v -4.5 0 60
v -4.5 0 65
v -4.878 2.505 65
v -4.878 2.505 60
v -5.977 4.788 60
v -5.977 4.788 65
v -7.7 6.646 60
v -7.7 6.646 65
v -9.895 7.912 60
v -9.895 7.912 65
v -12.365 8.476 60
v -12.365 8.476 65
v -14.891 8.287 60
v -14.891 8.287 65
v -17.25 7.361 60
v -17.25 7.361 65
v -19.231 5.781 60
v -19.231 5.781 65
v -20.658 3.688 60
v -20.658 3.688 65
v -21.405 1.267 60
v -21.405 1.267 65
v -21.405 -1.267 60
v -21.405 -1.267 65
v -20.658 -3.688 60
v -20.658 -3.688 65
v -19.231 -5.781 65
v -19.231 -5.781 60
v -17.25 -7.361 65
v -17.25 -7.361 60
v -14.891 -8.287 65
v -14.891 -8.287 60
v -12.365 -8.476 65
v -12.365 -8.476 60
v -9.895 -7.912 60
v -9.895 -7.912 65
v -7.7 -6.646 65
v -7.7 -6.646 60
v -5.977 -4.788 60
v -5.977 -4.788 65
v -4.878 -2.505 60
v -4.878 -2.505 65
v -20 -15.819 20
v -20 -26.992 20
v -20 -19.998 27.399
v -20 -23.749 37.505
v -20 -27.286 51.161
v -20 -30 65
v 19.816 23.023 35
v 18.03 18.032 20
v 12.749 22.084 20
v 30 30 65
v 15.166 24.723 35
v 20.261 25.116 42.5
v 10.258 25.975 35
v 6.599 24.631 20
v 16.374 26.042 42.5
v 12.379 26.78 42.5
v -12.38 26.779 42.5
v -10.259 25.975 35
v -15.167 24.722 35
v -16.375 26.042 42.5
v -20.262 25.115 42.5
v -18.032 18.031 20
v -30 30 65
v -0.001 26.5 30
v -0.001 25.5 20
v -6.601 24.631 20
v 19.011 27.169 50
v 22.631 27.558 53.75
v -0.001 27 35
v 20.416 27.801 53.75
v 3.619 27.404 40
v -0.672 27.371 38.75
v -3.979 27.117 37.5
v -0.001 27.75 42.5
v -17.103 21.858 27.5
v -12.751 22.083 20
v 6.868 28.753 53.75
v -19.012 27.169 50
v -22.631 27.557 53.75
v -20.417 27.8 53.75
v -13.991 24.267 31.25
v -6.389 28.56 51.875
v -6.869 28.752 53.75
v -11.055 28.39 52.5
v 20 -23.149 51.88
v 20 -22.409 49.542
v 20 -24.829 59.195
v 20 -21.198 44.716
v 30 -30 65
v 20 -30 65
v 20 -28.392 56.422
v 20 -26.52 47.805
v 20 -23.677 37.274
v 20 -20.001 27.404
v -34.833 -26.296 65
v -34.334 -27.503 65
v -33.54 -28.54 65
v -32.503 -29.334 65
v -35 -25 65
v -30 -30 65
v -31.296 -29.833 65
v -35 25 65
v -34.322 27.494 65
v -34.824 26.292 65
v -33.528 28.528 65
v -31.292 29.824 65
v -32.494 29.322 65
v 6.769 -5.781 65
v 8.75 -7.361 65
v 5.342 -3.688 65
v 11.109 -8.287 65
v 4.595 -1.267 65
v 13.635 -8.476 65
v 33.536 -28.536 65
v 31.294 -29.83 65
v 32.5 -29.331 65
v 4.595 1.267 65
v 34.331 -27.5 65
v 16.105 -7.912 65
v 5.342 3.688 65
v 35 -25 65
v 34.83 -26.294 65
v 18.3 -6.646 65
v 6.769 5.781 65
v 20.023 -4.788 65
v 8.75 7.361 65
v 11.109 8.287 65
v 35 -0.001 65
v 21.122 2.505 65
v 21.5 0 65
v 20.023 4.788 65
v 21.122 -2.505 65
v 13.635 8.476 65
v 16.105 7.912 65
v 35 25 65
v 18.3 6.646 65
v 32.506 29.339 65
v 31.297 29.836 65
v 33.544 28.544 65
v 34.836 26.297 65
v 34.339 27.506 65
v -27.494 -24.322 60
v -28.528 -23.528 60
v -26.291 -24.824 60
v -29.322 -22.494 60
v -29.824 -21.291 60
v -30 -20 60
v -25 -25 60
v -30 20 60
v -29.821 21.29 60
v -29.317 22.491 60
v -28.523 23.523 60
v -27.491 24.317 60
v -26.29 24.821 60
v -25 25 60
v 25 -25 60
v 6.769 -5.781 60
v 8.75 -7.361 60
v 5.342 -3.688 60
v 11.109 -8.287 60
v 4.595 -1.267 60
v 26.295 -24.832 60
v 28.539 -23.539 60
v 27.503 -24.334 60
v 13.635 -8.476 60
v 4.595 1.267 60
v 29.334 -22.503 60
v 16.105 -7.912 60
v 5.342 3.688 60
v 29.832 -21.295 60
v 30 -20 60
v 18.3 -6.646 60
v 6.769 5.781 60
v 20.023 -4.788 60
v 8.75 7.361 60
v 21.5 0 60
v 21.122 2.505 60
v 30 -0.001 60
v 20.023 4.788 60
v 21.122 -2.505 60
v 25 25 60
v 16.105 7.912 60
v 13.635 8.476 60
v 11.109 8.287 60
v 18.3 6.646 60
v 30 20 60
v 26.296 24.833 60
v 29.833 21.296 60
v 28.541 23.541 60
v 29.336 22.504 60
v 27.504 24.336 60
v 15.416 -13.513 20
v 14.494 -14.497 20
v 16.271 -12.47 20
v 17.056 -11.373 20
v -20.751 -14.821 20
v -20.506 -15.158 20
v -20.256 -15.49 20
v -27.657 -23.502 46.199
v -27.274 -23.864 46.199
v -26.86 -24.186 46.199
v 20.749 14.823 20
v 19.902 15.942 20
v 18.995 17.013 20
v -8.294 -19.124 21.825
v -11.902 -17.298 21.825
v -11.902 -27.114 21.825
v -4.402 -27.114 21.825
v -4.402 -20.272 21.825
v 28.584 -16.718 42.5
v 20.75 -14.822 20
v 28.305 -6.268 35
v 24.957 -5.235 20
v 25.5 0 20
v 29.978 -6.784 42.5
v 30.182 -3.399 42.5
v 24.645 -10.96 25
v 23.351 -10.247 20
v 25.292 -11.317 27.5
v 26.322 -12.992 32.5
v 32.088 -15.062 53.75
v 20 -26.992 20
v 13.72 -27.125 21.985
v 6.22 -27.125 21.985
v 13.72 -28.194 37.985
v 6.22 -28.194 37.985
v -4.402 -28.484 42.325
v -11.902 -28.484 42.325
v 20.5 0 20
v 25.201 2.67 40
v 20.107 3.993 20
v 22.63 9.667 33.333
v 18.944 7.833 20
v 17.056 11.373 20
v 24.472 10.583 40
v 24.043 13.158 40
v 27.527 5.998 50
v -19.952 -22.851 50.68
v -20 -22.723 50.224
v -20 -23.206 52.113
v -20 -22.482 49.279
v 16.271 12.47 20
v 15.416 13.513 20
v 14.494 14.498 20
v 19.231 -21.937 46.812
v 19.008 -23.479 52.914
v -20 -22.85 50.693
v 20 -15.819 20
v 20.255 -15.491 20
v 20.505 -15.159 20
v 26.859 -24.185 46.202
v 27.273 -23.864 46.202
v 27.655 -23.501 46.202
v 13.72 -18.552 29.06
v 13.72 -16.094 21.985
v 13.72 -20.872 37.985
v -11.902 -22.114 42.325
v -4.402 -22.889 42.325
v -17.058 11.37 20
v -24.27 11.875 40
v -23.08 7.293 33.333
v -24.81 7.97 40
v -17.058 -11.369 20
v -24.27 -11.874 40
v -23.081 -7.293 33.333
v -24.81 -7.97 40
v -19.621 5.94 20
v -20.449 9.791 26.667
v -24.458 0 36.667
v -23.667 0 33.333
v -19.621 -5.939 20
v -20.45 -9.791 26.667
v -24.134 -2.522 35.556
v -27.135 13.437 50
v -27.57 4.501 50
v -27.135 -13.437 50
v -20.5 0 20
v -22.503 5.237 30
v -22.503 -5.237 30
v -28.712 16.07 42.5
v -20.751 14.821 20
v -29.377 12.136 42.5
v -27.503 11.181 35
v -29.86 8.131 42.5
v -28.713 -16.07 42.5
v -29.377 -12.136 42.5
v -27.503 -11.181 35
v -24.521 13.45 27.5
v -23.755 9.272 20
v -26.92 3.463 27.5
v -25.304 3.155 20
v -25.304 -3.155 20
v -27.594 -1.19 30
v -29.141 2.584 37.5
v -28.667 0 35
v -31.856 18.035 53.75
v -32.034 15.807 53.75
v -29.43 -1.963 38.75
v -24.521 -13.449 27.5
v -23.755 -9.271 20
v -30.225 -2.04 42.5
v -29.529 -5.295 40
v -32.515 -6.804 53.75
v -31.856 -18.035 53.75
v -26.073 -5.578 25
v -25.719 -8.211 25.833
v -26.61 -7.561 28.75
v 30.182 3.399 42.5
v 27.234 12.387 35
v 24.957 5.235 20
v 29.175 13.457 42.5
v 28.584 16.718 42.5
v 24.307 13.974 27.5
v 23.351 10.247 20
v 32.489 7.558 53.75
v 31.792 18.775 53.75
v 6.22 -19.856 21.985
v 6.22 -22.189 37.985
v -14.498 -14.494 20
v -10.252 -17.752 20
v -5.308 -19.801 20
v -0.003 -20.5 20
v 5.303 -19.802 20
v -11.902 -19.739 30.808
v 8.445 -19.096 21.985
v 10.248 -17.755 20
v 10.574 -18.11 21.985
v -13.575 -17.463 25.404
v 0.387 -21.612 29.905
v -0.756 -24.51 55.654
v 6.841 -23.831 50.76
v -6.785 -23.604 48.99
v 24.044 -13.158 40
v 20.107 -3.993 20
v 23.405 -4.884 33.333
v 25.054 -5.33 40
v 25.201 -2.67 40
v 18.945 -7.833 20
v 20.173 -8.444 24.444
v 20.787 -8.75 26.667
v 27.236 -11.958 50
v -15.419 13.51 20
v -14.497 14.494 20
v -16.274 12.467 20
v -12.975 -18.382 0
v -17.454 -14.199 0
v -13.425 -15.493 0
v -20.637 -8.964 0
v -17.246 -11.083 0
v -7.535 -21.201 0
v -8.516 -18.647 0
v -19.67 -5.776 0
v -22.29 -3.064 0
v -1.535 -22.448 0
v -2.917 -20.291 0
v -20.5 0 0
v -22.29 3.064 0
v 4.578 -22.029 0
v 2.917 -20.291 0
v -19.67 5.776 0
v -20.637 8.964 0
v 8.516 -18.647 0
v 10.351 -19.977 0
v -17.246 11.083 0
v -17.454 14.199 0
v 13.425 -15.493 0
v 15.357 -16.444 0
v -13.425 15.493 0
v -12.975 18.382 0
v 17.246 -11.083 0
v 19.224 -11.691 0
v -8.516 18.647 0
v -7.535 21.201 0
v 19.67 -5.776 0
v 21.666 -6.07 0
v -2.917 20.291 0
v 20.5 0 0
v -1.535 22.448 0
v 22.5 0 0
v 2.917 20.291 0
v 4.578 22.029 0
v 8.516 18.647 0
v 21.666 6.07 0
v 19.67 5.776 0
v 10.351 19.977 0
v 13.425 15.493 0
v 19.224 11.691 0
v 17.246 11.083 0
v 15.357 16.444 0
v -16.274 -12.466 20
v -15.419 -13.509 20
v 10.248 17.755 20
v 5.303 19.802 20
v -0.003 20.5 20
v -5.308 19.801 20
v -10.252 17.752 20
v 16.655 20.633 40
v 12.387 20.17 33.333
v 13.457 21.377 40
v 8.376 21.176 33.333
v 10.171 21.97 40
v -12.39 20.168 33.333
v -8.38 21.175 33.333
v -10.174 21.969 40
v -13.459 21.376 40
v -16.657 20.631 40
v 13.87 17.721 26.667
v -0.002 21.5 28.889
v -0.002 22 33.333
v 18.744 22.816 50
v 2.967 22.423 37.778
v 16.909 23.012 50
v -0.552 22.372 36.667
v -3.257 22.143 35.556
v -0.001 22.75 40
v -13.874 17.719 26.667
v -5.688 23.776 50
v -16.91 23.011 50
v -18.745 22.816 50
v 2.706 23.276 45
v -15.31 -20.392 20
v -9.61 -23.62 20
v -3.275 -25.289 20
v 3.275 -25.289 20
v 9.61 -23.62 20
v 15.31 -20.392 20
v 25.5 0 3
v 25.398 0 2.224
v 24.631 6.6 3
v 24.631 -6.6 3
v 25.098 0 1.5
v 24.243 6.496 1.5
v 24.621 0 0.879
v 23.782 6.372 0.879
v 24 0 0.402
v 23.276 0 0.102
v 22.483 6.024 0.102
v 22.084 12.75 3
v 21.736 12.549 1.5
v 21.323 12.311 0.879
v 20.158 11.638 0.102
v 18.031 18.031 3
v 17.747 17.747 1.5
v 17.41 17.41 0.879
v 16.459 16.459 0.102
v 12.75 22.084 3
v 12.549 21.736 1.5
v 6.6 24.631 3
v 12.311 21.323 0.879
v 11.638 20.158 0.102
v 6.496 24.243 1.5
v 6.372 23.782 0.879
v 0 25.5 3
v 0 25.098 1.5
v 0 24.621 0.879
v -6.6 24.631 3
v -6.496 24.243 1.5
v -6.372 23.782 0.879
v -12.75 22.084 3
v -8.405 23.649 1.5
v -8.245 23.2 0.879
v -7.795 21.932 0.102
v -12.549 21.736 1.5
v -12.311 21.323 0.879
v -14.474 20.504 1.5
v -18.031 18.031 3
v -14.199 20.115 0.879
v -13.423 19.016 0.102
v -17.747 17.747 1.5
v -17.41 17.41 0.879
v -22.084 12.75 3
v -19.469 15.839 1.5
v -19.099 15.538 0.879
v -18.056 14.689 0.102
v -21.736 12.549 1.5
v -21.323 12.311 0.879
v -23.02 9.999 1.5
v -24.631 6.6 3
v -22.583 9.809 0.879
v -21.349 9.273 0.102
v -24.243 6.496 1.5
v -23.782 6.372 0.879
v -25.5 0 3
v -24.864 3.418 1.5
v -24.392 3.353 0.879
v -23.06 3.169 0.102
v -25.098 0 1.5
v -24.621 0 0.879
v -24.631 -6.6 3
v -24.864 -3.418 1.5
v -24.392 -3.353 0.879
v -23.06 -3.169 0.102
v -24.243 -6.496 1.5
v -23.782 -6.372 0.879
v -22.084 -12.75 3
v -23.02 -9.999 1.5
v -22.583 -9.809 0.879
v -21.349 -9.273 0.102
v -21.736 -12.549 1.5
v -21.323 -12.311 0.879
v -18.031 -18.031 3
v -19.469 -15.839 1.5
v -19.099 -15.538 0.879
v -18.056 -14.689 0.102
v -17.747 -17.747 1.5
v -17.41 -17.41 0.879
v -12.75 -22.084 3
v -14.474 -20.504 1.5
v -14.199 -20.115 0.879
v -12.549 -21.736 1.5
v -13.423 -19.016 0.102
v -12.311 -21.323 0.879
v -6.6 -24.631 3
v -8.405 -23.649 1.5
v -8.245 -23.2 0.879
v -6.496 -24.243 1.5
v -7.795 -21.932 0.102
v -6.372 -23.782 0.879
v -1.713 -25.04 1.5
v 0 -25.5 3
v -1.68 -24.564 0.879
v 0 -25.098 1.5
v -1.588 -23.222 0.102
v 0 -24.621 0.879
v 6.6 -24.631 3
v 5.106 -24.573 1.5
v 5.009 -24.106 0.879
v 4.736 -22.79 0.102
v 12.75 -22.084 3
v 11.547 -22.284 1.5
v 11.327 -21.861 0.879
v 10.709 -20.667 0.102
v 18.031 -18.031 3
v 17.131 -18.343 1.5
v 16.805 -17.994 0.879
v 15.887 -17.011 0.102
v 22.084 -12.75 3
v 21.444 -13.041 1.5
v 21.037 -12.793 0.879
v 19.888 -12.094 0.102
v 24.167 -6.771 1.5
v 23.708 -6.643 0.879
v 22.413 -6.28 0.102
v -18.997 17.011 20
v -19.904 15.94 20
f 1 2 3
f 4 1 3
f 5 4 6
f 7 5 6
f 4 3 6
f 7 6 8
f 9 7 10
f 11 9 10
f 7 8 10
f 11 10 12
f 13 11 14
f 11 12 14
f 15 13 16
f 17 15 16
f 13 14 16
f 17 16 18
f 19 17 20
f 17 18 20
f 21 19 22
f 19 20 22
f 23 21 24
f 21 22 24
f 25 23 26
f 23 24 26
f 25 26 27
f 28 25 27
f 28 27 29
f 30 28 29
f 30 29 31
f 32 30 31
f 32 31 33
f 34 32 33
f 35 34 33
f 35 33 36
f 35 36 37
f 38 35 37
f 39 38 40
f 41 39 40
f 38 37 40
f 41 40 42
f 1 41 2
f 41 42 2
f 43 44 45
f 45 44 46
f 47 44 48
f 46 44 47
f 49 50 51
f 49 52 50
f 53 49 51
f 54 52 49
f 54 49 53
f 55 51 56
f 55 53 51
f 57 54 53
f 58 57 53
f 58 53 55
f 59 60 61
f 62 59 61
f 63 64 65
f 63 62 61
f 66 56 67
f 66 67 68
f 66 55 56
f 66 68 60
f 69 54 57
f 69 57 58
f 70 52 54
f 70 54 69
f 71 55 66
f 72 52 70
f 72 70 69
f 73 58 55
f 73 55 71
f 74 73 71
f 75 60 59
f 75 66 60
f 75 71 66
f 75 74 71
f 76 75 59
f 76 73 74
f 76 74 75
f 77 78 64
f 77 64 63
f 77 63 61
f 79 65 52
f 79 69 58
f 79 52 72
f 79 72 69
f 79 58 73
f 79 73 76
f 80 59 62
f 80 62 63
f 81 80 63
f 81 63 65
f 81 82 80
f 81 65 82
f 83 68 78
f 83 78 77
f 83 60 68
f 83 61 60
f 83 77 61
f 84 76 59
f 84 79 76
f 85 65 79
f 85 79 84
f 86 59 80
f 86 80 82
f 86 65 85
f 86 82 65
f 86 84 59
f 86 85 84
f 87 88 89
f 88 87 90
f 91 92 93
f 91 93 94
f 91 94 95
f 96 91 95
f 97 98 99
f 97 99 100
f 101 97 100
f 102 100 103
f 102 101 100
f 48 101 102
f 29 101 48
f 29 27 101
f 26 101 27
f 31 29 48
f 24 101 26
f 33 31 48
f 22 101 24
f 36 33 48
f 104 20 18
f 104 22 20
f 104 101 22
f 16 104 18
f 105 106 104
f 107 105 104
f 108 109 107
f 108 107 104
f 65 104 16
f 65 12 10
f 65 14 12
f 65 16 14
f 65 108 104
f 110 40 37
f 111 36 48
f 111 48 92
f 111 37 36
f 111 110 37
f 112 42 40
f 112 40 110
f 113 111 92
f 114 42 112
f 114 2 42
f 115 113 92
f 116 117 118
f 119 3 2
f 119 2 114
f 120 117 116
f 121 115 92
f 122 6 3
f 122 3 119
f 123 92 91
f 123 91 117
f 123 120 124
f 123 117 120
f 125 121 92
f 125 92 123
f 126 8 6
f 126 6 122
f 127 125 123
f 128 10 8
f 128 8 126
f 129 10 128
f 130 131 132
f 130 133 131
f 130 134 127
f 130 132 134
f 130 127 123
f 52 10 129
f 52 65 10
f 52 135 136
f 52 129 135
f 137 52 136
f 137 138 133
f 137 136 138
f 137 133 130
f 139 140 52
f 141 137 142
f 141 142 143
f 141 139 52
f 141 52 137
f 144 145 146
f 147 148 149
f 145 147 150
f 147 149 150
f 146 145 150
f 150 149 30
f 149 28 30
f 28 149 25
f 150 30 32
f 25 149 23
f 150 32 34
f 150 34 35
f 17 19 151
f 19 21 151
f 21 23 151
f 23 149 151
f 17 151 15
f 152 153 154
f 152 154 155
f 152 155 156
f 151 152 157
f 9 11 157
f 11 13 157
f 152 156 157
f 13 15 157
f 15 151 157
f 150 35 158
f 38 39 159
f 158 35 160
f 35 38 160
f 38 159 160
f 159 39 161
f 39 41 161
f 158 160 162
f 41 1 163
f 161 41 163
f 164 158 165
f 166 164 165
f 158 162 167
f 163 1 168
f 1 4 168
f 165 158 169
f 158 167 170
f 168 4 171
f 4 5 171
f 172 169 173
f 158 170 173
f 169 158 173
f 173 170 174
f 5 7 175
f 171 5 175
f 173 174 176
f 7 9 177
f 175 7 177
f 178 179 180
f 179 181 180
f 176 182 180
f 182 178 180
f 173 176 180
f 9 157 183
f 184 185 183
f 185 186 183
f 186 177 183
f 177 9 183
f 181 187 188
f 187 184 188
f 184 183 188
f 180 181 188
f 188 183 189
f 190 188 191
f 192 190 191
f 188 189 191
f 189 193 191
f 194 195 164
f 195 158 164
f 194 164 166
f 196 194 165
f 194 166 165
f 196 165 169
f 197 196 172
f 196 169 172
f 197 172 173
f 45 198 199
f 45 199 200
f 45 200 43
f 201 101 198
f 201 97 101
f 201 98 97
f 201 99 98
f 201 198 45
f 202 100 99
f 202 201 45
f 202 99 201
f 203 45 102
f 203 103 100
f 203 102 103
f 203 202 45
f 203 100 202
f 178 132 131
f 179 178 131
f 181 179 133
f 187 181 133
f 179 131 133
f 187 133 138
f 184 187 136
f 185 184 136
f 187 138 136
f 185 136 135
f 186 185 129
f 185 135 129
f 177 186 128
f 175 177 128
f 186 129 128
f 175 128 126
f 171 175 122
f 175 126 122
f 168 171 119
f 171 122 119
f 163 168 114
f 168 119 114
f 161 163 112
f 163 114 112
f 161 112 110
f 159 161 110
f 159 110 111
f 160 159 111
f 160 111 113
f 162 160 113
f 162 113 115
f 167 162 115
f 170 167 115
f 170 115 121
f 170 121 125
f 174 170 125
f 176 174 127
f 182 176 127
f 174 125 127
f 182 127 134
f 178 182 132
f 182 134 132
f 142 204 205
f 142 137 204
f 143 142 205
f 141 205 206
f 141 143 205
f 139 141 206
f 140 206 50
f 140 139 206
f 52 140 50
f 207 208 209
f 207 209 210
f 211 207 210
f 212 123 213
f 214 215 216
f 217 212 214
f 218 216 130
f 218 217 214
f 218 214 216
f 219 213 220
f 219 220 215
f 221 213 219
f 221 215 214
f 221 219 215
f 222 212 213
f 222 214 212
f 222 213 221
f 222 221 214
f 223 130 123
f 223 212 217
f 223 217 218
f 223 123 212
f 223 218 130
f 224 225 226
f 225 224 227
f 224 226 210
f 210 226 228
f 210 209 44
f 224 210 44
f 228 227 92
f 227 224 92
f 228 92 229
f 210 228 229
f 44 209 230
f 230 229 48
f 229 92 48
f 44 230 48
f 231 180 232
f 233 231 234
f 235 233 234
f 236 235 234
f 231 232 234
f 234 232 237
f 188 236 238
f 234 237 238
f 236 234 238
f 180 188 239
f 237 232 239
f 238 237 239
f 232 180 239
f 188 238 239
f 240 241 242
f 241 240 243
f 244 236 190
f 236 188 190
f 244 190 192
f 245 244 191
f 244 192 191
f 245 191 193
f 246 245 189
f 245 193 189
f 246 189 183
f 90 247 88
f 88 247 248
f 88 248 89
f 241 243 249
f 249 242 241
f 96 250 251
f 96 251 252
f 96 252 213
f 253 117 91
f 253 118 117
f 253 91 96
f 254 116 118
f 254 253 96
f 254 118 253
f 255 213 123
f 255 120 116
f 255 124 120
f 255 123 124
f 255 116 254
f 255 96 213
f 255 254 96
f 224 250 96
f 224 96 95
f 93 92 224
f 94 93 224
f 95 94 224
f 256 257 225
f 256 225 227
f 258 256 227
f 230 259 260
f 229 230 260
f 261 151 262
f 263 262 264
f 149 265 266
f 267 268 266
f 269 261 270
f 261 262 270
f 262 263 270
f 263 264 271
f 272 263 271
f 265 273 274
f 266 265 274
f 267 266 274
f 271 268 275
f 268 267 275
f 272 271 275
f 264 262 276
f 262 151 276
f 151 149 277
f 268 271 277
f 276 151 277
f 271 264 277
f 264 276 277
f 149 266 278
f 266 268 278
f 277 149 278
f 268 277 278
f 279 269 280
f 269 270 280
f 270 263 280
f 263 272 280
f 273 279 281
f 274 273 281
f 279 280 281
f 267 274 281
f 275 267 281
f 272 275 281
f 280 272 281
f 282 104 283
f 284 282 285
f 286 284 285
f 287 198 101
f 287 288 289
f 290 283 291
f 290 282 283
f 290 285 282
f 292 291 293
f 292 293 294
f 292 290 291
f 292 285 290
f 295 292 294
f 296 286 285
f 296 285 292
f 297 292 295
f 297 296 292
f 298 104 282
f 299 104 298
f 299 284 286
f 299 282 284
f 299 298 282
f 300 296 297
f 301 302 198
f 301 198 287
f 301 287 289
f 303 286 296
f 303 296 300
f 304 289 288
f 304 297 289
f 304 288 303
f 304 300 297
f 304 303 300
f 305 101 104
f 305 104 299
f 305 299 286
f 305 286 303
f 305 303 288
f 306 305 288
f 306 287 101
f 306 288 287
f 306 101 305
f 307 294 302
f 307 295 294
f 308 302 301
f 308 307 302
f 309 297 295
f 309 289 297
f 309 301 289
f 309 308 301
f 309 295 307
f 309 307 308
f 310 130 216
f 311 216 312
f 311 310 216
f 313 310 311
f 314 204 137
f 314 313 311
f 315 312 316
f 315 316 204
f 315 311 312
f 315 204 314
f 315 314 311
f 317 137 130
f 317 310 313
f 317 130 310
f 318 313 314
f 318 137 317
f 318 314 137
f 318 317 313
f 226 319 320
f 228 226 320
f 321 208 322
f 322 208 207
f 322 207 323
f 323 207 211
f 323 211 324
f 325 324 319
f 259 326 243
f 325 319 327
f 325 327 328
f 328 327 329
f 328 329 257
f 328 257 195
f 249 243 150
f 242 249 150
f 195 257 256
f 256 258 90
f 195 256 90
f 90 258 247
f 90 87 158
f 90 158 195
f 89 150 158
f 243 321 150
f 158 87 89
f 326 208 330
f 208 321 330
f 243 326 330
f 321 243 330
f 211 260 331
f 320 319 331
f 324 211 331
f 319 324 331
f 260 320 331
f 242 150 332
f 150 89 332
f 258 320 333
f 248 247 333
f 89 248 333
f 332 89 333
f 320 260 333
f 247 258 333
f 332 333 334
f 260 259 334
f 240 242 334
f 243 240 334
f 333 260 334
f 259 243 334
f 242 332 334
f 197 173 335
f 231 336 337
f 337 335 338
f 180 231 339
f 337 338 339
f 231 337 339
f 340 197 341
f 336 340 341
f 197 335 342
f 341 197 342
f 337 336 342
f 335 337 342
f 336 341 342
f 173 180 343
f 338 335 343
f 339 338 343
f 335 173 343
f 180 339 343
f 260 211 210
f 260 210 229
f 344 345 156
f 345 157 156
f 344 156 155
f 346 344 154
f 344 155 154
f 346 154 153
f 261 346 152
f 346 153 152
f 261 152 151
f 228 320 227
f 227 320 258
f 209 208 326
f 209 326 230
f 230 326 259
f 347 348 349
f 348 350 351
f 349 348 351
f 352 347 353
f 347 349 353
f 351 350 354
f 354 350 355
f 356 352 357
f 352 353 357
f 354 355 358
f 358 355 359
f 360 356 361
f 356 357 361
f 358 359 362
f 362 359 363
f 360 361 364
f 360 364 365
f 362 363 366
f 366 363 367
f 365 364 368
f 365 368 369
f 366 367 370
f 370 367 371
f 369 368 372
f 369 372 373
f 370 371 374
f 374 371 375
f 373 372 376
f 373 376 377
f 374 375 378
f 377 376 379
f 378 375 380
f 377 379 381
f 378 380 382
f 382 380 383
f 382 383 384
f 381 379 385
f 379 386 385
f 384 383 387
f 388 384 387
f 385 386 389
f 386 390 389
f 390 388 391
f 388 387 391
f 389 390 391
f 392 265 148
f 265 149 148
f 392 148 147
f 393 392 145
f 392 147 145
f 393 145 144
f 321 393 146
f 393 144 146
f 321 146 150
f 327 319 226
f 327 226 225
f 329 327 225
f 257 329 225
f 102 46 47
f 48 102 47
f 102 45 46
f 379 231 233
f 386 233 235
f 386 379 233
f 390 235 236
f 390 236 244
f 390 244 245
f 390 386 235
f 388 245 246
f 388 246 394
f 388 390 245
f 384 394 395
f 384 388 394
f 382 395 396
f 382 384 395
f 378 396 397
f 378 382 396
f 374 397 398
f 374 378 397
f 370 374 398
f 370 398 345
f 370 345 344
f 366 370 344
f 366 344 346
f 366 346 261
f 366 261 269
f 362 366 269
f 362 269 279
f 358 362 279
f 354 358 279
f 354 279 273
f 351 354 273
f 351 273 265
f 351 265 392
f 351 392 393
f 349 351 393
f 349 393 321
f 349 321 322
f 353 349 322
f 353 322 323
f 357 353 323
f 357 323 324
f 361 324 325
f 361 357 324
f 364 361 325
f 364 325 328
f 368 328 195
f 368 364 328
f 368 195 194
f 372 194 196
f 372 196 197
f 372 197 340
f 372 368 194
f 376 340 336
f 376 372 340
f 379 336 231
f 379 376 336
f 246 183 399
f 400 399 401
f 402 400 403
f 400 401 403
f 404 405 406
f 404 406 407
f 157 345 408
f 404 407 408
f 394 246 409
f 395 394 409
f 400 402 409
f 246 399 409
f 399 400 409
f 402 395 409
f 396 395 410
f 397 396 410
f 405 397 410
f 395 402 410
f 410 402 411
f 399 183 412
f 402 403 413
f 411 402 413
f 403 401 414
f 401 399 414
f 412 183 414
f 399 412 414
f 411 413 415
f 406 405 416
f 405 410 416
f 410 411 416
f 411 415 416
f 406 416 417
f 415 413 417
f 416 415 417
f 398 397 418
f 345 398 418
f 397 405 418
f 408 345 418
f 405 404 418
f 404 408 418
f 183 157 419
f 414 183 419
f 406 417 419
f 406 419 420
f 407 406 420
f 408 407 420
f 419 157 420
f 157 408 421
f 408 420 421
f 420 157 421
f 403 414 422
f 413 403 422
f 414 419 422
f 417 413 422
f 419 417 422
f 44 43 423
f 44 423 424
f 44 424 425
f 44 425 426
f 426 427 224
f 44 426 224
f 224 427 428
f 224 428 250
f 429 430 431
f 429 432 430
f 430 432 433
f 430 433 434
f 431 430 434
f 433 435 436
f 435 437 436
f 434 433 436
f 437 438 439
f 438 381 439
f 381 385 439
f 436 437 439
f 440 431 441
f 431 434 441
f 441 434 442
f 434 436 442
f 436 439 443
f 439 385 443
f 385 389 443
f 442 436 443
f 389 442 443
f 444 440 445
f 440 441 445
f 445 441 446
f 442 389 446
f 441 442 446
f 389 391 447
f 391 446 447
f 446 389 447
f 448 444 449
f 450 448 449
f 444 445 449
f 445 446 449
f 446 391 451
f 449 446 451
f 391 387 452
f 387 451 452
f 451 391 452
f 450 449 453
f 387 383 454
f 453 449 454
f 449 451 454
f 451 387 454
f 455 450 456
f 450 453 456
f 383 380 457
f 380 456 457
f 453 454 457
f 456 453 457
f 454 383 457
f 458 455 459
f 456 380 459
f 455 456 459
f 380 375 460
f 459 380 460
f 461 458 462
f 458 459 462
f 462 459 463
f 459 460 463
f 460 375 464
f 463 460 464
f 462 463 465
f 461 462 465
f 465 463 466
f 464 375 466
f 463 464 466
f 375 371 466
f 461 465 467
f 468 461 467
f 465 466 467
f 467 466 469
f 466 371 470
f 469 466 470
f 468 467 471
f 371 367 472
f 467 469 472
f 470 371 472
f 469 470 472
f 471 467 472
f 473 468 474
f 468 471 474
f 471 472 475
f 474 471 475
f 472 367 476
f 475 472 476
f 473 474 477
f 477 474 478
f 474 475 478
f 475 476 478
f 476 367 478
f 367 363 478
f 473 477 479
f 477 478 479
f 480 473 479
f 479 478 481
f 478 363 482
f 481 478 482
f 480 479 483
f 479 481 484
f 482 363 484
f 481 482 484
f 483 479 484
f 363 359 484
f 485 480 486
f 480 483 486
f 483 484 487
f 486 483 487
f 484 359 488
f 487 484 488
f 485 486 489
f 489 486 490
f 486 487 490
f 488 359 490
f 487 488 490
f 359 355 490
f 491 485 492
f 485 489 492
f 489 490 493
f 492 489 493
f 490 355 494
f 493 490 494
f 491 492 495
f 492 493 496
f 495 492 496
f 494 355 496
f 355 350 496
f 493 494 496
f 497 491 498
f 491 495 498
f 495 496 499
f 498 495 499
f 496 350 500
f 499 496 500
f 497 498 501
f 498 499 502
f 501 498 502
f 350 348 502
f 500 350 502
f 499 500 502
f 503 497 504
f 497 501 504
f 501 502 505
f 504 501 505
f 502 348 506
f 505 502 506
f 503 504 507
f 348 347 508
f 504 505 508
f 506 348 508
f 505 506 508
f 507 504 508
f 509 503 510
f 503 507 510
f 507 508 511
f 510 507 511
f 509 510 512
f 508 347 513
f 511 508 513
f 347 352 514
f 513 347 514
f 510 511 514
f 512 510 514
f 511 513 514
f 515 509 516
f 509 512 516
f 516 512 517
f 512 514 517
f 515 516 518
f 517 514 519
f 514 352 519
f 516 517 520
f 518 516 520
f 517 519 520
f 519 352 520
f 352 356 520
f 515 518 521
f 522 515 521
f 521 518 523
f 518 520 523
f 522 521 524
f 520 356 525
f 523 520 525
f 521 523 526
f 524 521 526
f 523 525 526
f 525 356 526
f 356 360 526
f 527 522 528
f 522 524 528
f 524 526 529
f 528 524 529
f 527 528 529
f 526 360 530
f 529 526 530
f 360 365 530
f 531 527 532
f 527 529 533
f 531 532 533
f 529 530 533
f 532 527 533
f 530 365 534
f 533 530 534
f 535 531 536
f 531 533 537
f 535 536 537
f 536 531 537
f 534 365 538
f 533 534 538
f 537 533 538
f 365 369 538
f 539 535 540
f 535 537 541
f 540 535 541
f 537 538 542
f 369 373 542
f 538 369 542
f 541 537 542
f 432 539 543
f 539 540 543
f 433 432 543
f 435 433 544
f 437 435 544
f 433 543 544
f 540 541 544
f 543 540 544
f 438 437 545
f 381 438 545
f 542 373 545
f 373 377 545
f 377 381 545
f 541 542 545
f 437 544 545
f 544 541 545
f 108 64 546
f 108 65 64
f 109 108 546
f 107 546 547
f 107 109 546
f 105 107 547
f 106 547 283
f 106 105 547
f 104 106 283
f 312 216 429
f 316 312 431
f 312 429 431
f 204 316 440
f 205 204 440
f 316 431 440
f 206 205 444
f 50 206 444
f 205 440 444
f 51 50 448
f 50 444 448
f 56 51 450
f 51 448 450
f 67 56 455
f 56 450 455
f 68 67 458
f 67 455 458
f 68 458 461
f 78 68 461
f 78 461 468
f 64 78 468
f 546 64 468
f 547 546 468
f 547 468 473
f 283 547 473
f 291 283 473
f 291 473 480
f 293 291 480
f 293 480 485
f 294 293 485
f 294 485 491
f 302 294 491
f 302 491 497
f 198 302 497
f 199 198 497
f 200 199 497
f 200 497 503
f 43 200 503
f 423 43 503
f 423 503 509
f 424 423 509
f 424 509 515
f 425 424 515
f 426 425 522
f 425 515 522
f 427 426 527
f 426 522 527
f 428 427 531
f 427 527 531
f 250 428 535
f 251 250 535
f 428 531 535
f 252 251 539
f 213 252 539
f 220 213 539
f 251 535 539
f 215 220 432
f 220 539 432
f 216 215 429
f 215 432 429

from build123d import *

# Parameters (mm, degrees)
SKETCH005_AS_DRAWN_W              = 7.5
SKETCH005_AS_DRAWN_H              = 20.5
SKETCH005_AS_DRAWN_H_2            = 16
EXTRUDE_DEPTH                     = 30
EXTRUDE_ONTO_SKETCH005_ROLL_ANGLE = 90
SKETCH_R                          = 20.5
SKETCH003_R                       = 25.5
SKETCH004_R                       = 8.5
POCKET_DEPTH                      = 5
CYLINDER001_R                     = 20.5
CYLINDER001_DEPTH                 = 20
CYLINDER_R                        = 25.5
CYLINDER_DEPTH                    = 20
FILLET_R                          = 3


with BuildPart() as butoane:
    # Sketch005 as drawn → Extrude (new)
    with BuildSketch(Plane.XY):
        with Locations((-8.152101, 32.07517)):
            Rectangle(SKETCH005_AS_DRAWN_W, SKETCH005_AS_DRAWN_H)
        with Locations((9.96979, 29.984642)):
            Rectangle(SKETCH005_AS_DRAWN_W, SKETCH005_AS_DRAWN_H_2)
    extrude(amount=EXTRUDE_DEPTH)


with BuildPart() as butoane_1:
    # Extrude onto Sketch005 roll: moved
    add(butoane.part.rotate(Axis((0, 0, 0), (1, 0, 0)), EXTRUDE_ONTO_SKETCH005_ROLL_ANGLE))


with BuildPart() as butoane_2:
    # Extrude onto Sketch005 placement: moved
    add(butoane_1.part.moved(Location((0, -15, 0))))


with BuildPart() as loft_body:
    # Sketch → Loft section 0
    with BuildSketch(Plane.XY.offset(20)):
        Circle(SKETCH_R)
    # Sketch002 → Loft section 1
    with BuildSketch(Plane.XY.offset(60)):
        with BuildLine():
            Line((-24.999998, 25), (24.999999, 25))
            ThreePointArc((30, 20.000001), (28.540896, 23.540898), (24.999999, 25))
            Line((30, -19.999999), (30, 20.000001))
            ThreePointArc((24.999999, -25), (28.539164, -23.539164), (30, -19.999999))
            Line((-24.999998, -25), (24.999999, -25))
            ThreePointArc((-30, -19.999999), (-28.527665, -23.527666), (-24.999998, -25))
            Line((-30, 19.999997), (-30, -19.999999))
            ThreePointArc((-24.999998, 25), (-28.522614, 23.522614), (-30, 19.999997))
        make_face()
    loft()


with BuildPart() as pocket:
    # Sketch003 → Loft001 section 0
    with BuildSketch(Plane.XY.offset(20)):
        Circle(SKETCH003_R)
    # Sketch001 → Loft001 section 1
    with BuildSketch(Plane.XY.offset(65)):
        with BuildLine():
            Line((-35, -24.999999), (-35, 25))
            ThreePointArc((-30, 30), (-33.52786, 28.52786), (-35, 25))
            Line((-30, 30), (29.999999, 30))
            ThreePointArc((35, 25), (33.544012, 28.544013), (29.999999, 30))
            Line((35, 25), (35, -25.000001))
            ThreePointArc((30.000001, -30), (33.536169, -28.536168), (35, -25.000001))
            Line((-30.000003, -30), (30.000001, -30))
            ThreePointArc((-35, -24.999999), (-33.539778, -28.539776), (-30.000003, -30))
        make_face()
    loft()

    # Cut001: cut Loft body
    add(loft_body.part, mode=Mode.SUBTRACT)

    # Sketch004 → Pocket (cut)
    with BuildSketch(Plane.XY.offset(65)):
        with Locations((-13, 0)):
            Circle(SKETCH004_R)
        with Locations((13, 0)):
            Circle(SKETCH004_R)
    extrude(amount=-POCKET_DEPTH, mode=Mode.SUBTRACT)


with BuildPart() as cut002:
    # Sketch006 → Loft002 section 0
    with BuildSketch(Plane.XY.offset(20)):
        Polygon((20, -15), (20, -26.992193), (-20, -26.992193), (-20, -15), (0, -25), align=None)
    # Sketch007 → Loft002 section 1
    with BuildSketch(Plane.XY.offset(65)):
        Polygon((-20, -30), (20, -30), (20, -26.285252), (0, -28.799719), (-20, -26.499249), align=None)
    loft()

    # Fusion: union Pocket
    add(pocket.part)

    # Cut002: cut Butoane
    add(butoane_2.part, mode=Mode.SUBTRACT)


with BuildPart() as cilindru001:
    # Cylinder001 → Cylinder001 (new body)
    with BuildSketch(Plane.XY):
        Circle(CYLINDER001_R)
    extrude(amount=CYLINDER001_DEPTH)


with BuildPart() as fusion001:
    # Cylinder → Cylinder (new body)
    with BuildSketch(Plane.XY):
        Circle(CYLINDER_R)
    extrude(amount=CYLINDER_DEPTH)

    # Cut: cut Cilindru001
    add(cilindru001.part, mode=Mode.SUBTRACT)

    # Fillet
    fillet_edges = [fusion001.edges().sort_by_distance(p)[0] for p in [
        (-25.5, 0, 0),
    ]]
    fillet(fillet_edges, radius=FILLET_R)

    # Fusion001: union Cut002
    add(cut002.part)


solid = fusion001.part
